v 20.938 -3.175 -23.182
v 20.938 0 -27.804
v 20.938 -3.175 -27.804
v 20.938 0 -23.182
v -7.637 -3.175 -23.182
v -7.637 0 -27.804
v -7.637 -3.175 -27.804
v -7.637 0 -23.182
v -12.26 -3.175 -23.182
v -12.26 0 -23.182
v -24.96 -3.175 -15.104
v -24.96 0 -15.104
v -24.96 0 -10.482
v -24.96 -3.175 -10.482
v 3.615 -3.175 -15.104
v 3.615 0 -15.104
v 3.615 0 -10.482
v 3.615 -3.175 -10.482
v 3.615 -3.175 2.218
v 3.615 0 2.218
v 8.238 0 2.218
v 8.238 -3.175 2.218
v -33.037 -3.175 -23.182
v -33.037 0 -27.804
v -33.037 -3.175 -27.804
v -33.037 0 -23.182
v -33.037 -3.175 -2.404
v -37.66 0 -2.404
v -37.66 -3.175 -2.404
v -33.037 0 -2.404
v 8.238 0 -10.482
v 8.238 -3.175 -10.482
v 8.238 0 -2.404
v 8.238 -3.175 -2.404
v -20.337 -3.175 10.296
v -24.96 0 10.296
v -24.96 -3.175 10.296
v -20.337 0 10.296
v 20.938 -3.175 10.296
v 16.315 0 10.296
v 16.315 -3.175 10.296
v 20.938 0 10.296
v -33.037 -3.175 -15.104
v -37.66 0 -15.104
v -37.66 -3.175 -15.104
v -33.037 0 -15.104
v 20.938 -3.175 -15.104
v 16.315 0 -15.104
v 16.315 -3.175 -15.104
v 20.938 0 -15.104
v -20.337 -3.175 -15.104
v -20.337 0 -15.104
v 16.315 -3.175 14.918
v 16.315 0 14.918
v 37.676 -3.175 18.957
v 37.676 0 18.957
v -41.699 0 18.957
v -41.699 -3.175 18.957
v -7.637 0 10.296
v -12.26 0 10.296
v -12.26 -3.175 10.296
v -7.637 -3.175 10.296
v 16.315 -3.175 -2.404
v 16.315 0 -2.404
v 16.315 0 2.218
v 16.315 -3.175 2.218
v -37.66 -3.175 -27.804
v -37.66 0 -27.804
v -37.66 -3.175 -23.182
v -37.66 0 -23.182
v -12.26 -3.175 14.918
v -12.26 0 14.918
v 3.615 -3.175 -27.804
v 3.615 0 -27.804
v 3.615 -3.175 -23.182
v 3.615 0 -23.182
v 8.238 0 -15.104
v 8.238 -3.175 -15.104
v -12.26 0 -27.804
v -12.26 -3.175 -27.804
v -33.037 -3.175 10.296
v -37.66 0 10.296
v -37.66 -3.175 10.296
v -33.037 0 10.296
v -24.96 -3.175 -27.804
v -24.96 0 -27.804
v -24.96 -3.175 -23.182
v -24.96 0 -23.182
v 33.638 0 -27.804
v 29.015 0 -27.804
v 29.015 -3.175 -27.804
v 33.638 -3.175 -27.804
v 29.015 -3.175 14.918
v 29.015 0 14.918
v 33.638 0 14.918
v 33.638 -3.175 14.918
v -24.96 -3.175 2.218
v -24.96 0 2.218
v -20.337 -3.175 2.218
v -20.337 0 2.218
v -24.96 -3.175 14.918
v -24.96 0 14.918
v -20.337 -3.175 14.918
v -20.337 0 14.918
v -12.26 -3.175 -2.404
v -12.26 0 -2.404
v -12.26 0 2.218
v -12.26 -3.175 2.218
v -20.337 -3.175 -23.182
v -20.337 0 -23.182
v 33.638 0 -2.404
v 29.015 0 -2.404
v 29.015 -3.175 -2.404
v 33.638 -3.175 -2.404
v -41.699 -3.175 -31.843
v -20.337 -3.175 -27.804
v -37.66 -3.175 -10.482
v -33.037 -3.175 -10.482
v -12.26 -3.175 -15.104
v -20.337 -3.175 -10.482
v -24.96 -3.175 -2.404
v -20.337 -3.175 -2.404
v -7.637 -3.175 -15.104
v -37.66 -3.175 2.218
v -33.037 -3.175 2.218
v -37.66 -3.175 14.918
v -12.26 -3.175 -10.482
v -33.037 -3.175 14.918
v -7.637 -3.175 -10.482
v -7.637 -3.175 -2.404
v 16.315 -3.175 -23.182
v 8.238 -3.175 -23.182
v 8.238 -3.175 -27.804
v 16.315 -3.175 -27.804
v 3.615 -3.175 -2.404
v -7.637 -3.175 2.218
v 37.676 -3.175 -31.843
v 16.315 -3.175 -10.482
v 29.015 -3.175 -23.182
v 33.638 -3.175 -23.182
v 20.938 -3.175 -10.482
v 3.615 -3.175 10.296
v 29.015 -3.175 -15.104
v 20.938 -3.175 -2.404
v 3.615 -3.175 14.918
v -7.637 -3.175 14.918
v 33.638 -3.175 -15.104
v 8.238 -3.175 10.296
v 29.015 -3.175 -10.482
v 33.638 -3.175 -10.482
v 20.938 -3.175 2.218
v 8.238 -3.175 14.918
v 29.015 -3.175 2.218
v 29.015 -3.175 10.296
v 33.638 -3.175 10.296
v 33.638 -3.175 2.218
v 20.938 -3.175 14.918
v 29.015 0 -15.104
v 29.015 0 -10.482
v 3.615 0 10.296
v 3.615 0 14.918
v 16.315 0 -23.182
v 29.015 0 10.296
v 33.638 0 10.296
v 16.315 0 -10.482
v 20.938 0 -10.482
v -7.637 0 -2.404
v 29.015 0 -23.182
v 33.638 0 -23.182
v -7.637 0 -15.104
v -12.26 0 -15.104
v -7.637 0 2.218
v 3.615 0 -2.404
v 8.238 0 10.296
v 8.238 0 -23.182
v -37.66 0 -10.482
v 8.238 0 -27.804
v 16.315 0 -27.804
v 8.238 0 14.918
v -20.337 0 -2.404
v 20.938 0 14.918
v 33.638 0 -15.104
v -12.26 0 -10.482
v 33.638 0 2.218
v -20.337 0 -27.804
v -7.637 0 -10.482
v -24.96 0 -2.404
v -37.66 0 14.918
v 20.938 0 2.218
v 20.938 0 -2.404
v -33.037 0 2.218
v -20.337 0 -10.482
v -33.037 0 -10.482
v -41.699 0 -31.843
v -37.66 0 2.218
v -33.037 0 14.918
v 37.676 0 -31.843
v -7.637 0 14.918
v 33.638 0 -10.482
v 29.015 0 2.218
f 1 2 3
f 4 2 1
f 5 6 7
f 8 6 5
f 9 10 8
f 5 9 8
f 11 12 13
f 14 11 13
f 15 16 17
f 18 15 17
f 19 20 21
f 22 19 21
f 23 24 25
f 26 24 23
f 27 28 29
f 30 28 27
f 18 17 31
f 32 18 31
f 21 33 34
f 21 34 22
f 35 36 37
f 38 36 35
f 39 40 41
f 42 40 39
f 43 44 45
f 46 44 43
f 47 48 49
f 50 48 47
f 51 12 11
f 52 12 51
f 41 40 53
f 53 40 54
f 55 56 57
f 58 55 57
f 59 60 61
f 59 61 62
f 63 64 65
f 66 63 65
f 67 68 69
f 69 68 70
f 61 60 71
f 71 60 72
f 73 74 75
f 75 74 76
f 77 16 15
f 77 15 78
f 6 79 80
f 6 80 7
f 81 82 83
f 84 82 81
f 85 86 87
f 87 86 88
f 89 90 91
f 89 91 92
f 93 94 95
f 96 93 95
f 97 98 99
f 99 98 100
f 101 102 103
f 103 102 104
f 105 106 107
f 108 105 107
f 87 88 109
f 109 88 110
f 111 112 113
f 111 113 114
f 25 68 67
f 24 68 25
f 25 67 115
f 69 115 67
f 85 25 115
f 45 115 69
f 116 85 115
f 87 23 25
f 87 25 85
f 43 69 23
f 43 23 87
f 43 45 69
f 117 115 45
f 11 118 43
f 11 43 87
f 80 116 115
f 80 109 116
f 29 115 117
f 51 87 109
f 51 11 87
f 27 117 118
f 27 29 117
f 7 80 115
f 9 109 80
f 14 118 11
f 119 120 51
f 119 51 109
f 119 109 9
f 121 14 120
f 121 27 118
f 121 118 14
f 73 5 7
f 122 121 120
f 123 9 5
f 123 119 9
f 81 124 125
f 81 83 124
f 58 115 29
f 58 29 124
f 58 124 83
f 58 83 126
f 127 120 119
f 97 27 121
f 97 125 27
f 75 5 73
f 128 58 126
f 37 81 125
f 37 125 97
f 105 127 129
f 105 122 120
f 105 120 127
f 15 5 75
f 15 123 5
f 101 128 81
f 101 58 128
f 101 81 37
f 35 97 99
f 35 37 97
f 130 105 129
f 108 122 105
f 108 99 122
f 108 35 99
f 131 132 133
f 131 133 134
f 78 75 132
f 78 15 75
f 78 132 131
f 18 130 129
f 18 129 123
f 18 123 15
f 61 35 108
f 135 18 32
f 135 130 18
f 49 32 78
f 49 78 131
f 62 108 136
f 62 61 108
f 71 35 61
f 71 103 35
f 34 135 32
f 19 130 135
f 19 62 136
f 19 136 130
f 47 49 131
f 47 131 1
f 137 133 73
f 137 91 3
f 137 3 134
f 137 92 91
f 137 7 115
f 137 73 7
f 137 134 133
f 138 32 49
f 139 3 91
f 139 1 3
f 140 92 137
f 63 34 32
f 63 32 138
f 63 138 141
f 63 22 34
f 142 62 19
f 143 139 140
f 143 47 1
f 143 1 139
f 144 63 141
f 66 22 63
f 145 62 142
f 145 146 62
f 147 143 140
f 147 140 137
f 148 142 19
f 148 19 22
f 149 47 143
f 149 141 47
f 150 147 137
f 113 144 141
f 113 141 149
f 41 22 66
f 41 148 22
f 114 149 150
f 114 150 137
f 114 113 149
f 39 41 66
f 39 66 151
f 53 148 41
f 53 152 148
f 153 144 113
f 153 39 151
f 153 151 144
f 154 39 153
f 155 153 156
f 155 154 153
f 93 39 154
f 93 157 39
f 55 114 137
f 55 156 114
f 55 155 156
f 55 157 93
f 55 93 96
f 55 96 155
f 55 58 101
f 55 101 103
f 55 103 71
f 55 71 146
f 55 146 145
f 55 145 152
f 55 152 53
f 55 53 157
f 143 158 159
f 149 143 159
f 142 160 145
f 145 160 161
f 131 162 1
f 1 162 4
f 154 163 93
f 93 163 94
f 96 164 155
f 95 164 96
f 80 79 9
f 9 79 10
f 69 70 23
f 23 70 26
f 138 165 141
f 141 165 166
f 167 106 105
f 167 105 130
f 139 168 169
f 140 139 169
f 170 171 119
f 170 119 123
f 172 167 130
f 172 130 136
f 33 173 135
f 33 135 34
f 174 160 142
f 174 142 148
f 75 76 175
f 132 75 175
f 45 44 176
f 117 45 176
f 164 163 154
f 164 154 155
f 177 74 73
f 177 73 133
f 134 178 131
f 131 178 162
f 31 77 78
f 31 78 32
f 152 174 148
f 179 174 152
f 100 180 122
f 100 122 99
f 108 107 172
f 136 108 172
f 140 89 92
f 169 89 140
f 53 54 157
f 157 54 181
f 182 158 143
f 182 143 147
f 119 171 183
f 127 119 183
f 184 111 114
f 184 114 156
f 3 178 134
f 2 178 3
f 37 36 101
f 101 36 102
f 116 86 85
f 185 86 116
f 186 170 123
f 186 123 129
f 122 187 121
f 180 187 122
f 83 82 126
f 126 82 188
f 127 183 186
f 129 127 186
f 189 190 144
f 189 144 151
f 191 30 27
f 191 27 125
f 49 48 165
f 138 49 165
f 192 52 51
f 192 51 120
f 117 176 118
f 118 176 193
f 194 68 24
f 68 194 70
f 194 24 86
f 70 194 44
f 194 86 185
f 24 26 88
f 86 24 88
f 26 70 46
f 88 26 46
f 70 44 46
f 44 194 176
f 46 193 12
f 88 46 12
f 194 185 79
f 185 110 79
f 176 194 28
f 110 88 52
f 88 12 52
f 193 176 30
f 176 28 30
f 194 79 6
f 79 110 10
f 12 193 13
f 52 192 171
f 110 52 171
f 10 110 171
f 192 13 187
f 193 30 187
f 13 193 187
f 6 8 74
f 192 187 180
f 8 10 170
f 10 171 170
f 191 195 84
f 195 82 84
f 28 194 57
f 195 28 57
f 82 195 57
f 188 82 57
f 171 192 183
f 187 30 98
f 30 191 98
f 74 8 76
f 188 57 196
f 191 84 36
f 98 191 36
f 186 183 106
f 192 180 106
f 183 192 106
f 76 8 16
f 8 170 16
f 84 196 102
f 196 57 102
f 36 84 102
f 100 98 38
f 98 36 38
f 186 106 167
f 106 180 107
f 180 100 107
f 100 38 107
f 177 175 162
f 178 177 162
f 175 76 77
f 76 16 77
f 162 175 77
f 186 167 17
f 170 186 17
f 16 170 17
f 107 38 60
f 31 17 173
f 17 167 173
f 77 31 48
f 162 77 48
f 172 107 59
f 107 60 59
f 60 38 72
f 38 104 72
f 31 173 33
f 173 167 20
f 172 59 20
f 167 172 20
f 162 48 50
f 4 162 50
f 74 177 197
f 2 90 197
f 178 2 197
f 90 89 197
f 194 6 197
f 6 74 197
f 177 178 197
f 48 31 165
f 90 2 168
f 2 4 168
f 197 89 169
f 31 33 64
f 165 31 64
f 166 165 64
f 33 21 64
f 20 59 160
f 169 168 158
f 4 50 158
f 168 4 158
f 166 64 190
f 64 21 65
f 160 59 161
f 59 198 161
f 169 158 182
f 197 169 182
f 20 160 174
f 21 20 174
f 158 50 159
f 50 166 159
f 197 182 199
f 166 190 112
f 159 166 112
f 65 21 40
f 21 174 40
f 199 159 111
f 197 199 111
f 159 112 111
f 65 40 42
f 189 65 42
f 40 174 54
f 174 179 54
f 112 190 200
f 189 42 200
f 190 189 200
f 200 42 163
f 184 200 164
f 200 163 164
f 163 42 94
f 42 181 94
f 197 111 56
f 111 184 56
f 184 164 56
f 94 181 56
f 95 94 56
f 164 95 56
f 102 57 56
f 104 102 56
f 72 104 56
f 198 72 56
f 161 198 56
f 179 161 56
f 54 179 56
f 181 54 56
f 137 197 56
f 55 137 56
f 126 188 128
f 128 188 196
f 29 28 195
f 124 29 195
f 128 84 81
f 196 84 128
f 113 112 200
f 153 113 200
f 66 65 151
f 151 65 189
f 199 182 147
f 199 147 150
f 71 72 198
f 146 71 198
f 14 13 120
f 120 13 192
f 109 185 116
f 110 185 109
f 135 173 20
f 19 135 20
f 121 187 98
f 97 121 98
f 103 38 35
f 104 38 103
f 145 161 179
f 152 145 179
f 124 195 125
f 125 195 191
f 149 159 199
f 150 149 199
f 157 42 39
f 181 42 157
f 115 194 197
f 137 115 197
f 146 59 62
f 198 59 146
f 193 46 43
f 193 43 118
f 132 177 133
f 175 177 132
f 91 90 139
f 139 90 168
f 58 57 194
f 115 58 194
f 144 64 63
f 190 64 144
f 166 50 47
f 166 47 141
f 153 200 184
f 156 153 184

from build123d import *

# Parameters (mm, degrees)
F0_W     = 4.6228
F0_H     = 4.6228
F1_DEPTH = 3.175


with BuildPart() as f1:
    # F0 (on Front) → F1 (new body)
    with BuildSketch(Plane.XZ):
        Polygon((-2.011181, 18.956908), (-41.698681, 18.956908), (-41.698681, -31.843092), (37.676319, -31.843092), (37.676319, 18.956908), align=None)
        with Locations((-35.348681, -25.493092)):
            Rectangle(F0_W, F0_H, mode=Mode.SUBTRACT)
        with Locations((-22.648681, -25.493092)):
            Rectangle(F0_W, F0_H, mode=Mode.SUBTRACT)
        with Locations((-9.948681, -25.493092)):
            Rectangle(F0_W, F0_H, mode=Mode.SUBTRACT)
        with Locations((-35.348681, -12.793092)):
            Rectangle(F0_W, F0_H, mode=Mode.SUBTRACT)
        with Locations((-22.648681, -12.793092)):
            Rectangle(F0_W, F0_H, mode=Mode.SUBTRACT)
        with Locations((-9.948681, -12.793092)):
            Rectangle(F0_W, F0_H, mode=Mode.SUBTRACT)
        with Locations((5.926319, -25.493092)):
            Rectangle(F0_W, F0_H, mode=Mode.SUBTRACT)
        with Locations((18.626319, -25.493092)):
            Rectangle(F0_W, F0_H, mode=Mode.SUBTRACT)
        with Locations((31.326319, -25.493092)):
            Rectangle(F0_W, F0_H, mode=Mode.SUBTRACT)
        with Locations((5.926319, -12.793092)):
            Rectangle(F0_W, F0_H, mode=Mode.SUBTRACT)
        with Locations((18.626319, -12.793092)):
            Rectangle(F0_W, F0_H, mode=Mode.SUBTRACT)
        with Locations((31.326319, -12.793092)):
            Rectangle(F0_W, F0_H, mode=Mode.SUBTRACT)
        with Locations((-35.348681, -0.093092)):
            Rectangle(F0_W, F0_H, mode=Mode.SUBTRACT)
        with Locations((-22.648681, -0.093092)):
            Rectangle(F0_W, F0_H, mode=Mode.SUBTRACT)
        with Locations((-9.948681, -0.093092)):
            Rectangle(F0_W, F0_H, mode=Mode.SUBTRACT)
        with Locations((-35.348681, 12.606908)):
            Rectangle(F0_W, F0_H, mode=Mode.SUBTRACT)
        with Locations((-22.648681, 12.606908)):
            Rectangle(F0_W, F0_H, mode=Mode.SUBTRACT)
        with Locations((-9.948681, 12.606908)):
            Rectangle(F0_W, F0_H, mode=Mode.SUBTRACT)
        with Locations((5.926319, -0.093092)):
            Rectangle(F0_W, F0_H, mode=Mode.SUBTRACT)
        with Locations((18.626319, -0.093092)):
            Rectangle(F0_W, F0_H, mode=Mode.SUBTRACT)
        with Locations((31.326319, -0.093092)):
            Rectangle(F0_W, F0_H, mode=Mode.SUBTRACT)
        with Locations((5.926319, 12.606908)):
            Rectangle(F0_W, F0_H, mode=Mode.SUBTRACT)
        with Locations((18.626319, 12.606908)):
            Rectangle(F0_W, F0_H, mode=Mode.SUBTRACT)
        with Locations((31.326319, 12.606908)):
            Rectangle(F0_W, F0_H, mode=Mode.SUBTRACT)
    extrude(amount=F1_DEPTH)


solid = f1.part
